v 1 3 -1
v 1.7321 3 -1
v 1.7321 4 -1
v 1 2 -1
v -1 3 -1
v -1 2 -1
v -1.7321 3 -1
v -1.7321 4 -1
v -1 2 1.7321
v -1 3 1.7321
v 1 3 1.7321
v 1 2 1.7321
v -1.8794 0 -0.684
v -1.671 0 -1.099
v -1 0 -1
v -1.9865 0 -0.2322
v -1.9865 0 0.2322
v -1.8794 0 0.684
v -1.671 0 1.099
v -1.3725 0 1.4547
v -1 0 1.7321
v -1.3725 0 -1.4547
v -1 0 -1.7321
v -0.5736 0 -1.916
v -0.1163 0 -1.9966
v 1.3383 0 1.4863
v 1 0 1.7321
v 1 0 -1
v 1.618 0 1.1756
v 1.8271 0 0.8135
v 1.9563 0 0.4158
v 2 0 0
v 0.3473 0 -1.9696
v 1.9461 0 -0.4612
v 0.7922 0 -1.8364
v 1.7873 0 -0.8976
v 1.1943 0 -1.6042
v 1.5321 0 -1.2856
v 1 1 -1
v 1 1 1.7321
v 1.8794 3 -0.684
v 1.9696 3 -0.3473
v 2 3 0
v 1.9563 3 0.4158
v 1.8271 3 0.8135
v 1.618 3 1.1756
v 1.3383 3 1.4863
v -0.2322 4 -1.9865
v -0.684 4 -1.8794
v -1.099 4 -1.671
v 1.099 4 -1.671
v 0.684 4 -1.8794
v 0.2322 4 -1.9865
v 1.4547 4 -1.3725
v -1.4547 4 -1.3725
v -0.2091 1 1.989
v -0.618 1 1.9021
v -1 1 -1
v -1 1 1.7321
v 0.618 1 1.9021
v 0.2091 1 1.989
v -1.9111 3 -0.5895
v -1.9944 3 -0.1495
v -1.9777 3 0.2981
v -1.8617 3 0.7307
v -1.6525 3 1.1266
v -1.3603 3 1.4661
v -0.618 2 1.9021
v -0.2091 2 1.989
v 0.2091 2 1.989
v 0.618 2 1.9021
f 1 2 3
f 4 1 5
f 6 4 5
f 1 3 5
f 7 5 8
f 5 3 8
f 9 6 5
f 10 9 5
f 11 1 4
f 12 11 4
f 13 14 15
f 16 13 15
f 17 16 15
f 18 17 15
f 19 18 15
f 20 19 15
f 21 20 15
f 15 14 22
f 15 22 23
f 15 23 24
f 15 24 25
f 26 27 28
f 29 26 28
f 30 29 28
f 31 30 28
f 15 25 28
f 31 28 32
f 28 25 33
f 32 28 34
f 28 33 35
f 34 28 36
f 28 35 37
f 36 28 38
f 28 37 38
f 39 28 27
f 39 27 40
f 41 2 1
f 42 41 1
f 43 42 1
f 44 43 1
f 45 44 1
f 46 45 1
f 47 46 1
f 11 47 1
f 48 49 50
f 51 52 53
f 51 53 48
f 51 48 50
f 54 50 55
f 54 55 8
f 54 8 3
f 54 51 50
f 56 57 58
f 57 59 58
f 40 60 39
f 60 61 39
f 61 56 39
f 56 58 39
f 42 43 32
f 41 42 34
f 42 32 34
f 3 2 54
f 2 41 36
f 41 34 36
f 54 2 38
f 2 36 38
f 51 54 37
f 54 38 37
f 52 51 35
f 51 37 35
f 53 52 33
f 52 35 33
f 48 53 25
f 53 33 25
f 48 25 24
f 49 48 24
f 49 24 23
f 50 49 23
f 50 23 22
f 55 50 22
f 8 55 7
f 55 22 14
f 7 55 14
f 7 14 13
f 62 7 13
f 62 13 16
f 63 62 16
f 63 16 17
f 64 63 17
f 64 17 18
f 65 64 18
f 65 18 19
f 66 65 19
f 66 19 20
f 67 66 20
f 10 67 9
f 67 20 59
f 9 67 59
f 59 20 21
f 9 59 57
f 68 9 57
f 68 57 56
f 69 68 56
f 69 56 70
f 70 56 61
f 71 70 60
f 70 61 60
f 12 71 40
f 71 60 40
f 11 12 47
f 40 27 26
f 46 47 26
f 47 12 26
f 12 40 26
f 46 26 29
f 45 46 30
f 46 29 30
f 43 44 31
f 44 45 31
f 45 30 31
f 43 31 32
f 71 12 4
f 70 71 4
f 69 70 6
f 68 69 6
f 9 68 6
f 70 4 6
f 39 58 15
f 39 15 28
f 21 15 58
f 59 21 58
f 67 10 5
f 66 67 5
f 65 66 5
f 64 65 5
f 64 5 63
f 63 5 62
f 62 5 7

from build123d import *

# Parameters (mm, degrees)
SKETCH1_R               = 2
BOSS_EXTRUDE1_DEPTH     = 4
SKETCH2_W               = 2
SKETCH2_H               = 1
CUT_EXTRUDE1_DEPTH      = 3
CUT_EXTRUDE1_DEPTH_BACK = 1


with BuildPart() as part:
    # Sketch1 → Boss-Extrude1 (new body)
    with BuildSketch(Plane(origin=(0, 0, 0), x_dir=(1, 0, 0), z_dir=(0, 1, 0))):
        Circle(SKETCH1_R)
    extrude(amount=BOSS_EXTRUDE1_DEPTH)

    # Sketch2 → Cut-Extrude1 (cut, two sides)
    with BuildSketch(Plane.XY) as cut_extrude1_sk:
        Polygon((-2, 4), (2, 4), (2, 3), (1, 3), (1, 2), (-1, 2), (-1, 3), (-2, 3), align=None)
        with Locations((0, 0.5)):
            Rectangle(SKETCH2_W, SKETCH2_H)
    extrude(amount=CUT_EXTRUDE1_DEPTH, mode=Mode.SUBTRACT)
    extrude(cut_extrude1_sk.sketch, amount=-CUT_EXTRUDE1_DEPTH_BACK, mode=Mode.SUBTRACT)


solid = part.part
